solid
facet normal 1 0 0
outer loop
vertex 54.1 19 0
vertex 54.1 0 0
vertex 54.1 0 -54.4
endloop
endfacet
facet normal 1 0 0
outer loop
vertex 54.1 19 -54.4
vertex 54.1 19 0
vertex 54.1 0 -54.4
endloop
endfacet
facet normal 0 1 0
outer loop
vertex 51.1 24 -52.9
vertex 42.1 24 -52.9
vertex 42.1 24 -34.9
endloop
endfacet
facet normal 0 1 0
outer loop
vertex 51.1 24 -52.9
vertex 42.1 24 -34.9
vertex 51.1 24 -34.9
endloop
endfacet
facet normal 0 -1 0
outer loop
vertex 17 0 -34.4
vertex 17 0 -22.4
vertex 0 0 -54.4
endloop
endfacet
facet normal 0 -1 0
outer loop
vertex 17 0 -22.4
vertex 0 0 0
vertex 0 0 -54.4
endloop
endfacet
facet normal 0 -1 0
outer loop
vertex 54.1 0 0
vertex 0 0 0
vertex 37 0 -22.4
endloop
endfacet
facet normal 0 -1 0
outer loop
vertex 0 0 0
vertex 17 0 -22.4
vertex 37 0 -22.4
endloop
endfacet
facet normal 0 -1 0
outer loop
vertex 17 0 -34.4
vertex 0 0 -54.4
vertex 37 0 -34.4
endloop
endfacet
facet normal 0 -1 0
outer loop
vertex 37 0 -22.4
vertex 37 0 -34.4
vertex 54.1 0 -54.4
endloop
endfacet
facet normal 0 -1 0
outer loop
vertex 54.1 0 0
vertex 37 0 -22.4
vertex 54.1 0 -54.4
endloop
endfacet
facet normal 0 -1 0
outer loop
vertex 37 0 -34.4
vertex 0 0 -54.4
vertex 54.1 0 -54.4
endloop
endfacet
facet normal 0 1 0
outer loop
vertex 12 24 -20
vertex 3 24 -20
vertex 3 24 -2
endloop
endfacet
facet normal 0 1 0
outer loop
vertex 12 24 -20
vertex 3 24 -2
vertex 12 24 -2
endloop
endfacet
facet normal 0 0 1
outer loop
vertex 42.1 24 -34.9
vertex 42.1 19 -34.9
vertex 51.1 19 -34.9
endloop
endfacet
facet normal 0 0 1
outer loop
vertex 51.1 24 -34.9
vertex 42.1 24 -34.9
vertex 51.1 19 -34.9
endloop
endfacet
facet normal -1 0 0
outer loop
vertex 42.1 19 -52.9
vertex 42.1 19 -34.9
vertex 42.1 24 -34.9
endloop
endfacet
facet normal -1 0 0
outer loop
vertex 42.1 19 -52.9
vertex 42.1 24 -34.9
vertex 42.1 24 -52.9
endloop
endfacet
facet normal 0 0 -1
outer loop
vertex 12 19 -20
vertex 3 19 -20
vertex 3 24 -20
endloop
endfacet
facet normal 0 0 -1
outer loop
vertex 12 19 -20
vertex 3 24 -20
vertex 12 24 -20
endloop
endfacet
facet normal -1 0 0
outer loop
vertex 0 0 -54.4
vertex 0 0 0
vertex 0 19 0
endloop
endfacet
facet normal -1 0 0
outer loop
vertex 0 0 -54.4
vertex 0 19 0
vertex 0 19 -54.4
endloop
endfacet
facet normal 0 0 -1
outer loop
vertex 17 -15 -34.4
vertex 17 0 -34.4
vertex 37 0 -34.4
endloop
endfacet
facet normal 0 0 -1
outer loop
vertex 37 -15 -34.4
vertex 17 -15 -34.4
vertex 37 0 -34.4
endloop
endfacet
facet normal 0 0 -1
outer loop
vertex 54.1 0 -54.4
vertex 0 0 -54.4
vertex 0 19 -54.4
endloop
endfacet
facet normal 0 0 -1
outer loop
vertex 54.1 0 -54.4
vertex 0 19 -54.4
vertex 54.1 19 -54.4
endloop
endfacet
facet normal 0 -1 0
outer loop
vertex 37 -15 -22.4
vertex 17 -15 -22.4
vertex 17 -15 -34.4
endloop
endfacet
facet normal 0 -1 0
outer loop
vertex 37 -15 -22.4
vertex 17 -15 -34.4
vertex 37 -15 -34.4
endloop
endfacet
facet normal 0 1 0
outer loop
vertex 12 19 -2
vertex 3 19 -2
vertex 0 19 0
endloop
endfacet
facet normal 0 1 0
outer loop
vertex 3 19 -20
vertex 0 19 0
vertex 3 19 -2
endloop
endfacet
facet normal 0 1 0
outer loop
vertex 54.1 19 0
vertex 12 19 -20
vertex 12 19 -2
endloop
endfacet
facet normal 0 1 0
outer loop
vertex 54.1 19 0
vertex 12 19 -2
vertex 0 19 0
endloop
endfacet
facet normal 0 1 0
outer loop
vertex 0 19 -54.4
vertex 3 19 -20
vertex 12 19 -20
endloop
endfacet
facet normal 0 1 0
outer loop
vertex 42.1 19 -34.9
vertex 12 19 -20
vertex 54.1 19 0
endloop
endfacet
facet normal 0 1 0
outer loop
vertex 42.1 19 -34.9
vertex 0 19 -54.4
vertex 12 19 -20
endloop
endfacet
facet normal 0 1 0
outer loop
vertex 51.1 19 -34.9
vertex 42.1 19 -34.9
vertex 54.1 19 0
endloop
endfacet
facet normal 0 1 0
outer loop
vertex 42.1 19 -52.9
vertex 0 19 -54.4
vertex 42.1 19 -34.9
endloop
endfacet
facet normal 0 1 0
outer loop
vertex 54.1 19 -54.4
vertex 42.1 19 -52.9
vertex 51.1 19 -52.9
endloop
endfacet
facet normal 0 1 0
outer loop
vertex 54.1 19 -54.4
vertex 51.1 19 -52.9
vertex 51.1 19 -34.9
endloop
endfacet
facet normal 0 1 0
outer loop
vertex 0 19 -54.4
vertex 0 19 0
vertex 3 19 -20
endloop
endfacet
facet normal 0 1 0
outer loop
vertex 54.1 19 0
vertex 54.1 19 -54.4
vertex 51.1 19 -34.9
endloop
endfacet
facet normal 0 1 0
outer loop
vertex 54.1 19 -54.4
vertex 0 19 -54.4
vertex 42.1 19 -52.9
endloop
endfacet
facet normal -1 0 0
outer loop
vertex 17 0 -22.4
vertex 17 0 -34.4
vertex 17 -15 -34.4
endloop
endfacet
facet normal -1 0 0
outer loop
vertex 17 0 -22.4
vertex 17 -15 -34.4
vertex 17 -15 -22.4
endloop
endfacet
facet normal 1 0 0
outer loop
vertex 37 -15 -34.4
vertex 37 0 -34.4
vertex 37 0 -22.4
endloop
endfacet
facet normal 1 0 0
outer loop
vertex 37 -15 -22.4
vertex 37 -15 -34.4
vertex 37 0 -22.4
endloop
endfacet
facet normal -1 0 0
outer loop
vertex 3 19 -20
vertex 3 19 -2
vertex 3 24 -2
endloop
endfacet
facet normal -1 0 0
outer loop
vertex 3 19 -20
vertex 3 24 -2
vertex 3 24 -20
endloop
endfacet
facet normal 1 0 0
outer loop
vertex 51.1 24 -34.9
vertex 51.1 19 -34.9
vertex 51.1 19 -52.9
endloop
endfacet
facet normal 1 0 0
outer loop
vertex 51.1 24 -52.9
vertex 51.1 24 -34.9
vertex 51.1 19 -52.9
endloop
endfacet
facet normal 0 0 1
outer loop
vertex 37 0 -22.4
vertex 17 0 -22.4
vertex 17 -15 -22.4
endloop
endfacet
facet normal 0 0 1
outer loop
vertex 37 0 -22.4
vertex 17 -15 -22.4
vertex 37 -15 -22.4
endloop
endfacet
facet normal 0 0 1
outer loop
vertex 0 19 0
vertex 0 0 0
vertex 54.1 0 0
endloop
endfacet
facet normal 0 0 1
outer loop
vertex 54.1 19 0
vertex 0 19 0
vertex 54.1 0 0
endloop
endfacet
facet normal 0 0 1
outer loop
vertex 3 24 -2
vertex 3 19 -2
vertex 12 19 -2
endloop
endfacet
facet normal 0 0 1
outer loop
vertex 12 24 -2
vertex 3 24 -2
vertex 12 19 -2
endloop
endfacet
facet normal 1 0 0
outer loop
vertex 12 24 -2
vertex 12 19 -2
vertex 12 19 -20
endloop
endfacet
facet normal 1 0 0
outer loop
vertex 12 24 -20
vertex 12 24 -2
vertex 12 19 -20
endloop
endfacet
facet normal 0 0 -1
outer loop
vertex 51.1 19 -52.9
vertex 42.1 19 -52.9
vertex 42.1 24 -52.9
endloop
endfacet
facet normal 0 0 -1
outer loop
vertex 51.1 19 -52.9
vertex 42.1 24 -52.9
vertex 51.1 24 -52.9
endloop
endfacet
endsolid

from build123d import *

# Parameters (mm, degrees)
ESQUISSE1_W        = 54.1
ESQUISSE1_H        = 54.4
BOSS_EXTRU_1_DEPTH = 19
ESQUISSE2_W        = 20
ESQUISSE2_H        = 12
BOSS_EXTRU_2_DEPTH = 15
ESQUISSE3_W        = 9
ESQUISSE3_H        = 18
BOSS_EXTRU_3_DEPTH = 5


with BuildPart() as part:
    # Esquisse1 → Boss.-Extru.1 (new body)
    with BuildSketch(Plane(origin=(0, 0, 0), x_dir=(1, 0, 0), z_dir=(0, 1, 0))):
        with Locations((27.05, 27.2)):
            Rectangle(ESQUISSE1_W, ESQUISSE1_H)
    extrude(amount=BOSS_EXTRU_1_DEPTH)

    # Esquisse2 → Boss.-Extru.2 (add)
    with BuildSketch(Plane.XZ):
        with Locations((27, -28.4)):
            Rectangle(ESQUISSE2_W, ESQUISSE2_H)
    extrude(amount=BOSS_EXTRU_2_DEPTH)

    # Esquisse3 → Boss.-Extru.3 (add)
    with BuildSketch(Plane(origin=(0, 19, 0), x_dir=(1, 0, 0), z_dir=(0, 1, 0))):
        with Locations((46.6, 43.9)):
            Rectangle(ESQUISSE3_W, ESQUISSE3_H)
        with Locations((7.5, 11)):
            Rectangle(ESQUISSE3_W, ESQUISSE3_H)
    extrude(amount=BOSS_EXTRU_3_DEPTH)


solid = part.part
